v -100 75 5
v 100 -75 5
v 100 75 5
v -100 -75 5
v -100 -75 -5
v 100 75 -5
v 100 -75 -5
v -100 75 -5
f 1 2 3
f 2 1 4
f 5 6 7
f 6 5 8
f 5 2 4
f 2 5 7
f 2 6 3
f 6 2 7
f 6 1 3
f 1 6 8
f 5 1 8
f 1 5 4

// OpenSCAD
$fn=64;

plate_x = 200;
plate_y = 150;
plate_th = 10;

module tooling_plate(x, y, th){
    translate([-x/2, -y/2, -th/2])
        cube([x, y, th], center=false);
}

tooling_plate(plate_x, plate_y, plate_th);
